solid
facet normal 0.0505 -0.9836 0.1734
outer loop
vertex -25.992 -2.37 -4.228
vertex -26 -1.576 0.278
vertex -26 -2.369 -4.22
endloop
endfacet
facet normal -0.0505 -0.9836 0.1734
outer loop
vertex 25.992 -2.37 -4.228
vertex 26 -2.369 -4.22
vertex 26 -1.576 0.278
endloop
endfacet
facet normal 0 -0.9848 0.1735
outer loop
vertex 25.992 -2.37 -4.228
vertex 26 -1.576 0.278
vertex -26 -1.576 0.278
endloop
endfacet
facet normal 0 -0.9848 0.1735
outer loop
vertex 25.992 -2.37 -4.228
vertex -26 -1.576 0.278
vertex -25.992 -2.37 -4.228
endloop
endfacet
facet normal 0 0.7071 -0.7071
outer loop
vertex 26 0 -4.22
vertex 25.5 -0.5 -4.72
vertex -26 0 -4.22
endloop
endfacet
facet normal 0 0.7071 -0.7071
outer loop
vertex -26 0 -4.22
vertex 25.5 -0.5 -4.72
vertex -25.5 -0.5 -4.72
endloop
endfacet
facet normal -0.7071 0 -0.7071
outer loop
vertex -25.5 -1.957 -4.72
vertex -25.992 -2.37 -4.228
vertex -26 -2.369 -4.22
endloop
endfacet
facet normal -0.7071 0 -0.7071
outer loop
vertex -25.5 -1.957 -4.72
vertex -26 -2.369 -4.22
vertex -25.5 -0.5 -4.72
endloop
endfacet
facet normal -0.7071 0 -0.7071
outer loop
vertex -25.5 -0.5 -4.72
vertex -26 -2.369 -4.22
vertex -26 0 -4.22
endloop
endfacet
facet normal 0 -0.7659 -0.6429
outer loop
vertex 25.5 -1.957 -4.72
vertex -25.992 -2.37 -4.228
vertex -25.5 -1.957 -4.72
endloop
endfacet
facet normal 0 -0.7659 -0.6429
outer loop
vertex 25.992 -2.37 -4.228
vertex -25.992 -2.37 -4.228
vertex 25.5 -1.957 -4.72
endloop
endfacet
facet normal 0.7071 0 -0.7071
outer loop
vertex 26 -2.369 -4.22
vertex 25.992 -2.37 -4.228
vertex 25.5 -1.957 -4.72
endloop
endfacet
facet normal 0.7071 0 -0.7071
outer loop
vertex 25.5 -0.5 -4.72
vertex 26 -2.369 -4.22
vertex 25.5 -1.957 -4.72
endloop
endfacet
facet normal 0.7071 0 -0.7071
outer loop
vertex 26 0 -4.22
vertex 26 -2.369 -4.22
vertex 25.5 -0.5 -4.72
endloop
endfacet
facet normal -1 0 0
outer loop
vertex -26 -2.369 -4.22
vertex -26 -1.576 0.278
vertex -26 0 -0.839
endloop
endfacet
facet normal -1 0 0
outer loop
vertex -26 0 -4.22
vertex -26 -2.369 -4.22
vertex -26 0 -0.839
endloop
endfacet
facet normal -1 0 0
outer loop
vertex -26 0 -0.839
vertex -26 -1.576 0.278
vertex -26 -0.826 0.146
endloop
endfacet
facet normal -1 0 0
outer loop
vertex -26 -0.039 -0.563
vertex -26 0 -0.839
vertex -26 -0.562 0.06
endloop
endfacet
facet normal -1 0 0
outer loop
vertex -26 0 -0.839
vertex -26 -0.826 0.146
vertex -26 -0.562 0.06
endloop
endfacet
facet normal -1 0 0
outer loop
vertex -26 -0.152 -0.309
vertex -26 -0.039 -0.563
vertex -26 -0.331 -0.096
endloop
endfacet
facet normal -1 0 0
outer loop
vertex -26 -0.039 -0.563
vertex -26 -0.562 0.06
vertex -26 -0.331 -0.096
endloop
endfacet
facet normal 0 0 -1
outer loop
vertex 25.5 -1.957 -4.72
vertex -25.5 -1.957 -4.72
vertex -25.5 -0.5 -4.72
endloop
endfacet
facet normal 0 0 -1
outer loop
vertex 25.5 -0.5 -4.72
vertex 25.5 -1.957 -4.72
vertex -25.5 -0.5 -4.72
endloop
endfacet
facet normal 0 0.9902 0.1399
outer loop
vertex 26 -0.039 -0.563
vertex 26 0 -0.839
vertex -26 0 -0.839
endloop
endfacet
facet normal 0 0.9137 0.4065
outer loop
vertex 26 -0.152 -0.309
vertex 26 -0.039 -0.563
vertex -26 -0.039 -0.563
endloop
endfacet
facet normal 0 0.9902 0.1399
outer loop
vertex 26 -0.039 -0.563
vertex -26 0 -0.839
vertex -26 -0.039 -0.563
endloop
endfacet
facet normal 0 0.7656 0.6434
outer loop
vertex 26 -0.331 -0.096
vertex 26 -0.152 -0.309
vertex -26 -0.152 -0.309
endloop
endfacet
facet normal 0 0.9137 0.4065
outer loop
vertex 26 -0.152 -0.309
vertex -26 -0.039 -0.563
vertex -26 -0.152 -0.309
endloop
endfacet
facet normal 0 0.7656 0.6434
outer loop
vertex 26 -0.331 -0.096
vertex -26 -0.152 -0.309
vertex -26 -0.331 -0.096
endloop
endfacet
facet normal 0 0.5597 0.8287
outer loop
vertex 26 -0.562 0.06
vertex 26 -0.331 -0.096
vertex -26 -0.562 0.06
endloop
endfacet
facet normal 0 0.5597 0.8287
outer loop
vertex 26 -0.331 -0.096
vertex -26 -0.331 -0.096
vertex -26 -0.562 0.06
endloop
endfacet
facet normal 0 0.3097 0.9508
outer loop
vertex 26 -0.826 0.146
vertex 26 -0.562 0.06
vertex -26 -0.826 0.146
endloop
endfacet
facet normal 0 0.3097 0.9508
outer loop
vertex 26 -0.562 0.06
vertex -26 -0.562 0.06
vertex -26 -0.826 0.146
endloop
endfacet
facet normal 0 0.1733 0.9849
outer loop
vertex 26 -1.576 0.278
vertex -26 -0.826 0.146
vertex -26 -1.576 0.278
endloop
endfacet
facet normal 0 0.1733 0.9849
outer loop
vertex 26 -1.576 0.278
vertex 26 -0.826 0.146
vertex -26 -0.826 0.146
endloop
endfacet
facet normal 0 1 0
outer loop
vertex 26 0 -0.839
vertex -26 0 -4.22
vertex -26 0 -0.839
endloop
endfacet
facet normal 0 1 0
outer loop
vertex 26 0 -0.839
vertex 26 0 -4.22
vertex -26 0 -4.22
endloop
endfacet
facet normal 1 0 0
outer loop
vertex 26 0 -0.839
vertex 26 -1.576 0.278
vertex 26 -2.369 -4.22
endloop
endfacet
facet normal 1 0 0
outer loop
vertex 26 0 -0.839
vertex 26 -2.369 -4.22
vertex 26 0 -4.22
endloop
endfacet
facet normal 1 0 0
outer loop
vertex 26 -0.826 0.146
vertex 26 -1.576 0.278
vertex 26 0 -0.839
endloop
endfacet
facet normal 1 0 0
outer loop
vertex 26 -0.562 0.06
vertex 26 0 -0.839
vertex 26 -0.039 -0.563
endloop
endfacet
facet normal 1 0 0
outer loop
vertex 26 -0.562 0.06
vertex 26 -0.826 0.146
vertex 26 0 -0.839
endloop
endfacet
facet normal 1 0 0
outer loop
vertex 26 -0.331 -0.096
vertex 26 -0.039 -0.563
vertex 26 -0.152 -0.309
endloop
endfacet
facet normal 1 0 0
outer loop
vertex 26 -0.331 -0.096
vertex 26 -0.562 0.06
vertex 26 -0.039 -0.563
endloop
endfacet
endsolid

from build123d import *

# Parameters (mm, degrees)
PAD001_DEPTH    = 26
CHAMFER002_SIZE = 0.5
FILLET001_R     = 1


with BuildPart() as part:
    # Sketch002 → Pad001 (new body, symmetric)
    with BuildSketch(Plane.YZ):
        Polygon((0, 0), (-1.575692, 0.277837), (-2.456946, -4.72), (0, -4.72), align=None)
    extrude(amount=PAD001_DEPTH, both=True)

    # Chamfer002
    chamfer002_edges = [part.edges().sort_by_distance(p)[0] for p in [
        (0, -2.456946, -4.72),
        (0, 0, -4.72),
        (-26, -1.228473, -4.72),
        (26, -1.228473, -4.72),
    ]]
    chamfer(chamfer002_edges, length=CHAMFER002_SIZE)

    # Fillet001
    fillet001_edges = [part.edges().sort_by_distance(p)[0] for p in [
        (0, 0, 0),
    ]]
    fillet(fillet001_edges, radius=FILLET001_R)


solid = part.part
